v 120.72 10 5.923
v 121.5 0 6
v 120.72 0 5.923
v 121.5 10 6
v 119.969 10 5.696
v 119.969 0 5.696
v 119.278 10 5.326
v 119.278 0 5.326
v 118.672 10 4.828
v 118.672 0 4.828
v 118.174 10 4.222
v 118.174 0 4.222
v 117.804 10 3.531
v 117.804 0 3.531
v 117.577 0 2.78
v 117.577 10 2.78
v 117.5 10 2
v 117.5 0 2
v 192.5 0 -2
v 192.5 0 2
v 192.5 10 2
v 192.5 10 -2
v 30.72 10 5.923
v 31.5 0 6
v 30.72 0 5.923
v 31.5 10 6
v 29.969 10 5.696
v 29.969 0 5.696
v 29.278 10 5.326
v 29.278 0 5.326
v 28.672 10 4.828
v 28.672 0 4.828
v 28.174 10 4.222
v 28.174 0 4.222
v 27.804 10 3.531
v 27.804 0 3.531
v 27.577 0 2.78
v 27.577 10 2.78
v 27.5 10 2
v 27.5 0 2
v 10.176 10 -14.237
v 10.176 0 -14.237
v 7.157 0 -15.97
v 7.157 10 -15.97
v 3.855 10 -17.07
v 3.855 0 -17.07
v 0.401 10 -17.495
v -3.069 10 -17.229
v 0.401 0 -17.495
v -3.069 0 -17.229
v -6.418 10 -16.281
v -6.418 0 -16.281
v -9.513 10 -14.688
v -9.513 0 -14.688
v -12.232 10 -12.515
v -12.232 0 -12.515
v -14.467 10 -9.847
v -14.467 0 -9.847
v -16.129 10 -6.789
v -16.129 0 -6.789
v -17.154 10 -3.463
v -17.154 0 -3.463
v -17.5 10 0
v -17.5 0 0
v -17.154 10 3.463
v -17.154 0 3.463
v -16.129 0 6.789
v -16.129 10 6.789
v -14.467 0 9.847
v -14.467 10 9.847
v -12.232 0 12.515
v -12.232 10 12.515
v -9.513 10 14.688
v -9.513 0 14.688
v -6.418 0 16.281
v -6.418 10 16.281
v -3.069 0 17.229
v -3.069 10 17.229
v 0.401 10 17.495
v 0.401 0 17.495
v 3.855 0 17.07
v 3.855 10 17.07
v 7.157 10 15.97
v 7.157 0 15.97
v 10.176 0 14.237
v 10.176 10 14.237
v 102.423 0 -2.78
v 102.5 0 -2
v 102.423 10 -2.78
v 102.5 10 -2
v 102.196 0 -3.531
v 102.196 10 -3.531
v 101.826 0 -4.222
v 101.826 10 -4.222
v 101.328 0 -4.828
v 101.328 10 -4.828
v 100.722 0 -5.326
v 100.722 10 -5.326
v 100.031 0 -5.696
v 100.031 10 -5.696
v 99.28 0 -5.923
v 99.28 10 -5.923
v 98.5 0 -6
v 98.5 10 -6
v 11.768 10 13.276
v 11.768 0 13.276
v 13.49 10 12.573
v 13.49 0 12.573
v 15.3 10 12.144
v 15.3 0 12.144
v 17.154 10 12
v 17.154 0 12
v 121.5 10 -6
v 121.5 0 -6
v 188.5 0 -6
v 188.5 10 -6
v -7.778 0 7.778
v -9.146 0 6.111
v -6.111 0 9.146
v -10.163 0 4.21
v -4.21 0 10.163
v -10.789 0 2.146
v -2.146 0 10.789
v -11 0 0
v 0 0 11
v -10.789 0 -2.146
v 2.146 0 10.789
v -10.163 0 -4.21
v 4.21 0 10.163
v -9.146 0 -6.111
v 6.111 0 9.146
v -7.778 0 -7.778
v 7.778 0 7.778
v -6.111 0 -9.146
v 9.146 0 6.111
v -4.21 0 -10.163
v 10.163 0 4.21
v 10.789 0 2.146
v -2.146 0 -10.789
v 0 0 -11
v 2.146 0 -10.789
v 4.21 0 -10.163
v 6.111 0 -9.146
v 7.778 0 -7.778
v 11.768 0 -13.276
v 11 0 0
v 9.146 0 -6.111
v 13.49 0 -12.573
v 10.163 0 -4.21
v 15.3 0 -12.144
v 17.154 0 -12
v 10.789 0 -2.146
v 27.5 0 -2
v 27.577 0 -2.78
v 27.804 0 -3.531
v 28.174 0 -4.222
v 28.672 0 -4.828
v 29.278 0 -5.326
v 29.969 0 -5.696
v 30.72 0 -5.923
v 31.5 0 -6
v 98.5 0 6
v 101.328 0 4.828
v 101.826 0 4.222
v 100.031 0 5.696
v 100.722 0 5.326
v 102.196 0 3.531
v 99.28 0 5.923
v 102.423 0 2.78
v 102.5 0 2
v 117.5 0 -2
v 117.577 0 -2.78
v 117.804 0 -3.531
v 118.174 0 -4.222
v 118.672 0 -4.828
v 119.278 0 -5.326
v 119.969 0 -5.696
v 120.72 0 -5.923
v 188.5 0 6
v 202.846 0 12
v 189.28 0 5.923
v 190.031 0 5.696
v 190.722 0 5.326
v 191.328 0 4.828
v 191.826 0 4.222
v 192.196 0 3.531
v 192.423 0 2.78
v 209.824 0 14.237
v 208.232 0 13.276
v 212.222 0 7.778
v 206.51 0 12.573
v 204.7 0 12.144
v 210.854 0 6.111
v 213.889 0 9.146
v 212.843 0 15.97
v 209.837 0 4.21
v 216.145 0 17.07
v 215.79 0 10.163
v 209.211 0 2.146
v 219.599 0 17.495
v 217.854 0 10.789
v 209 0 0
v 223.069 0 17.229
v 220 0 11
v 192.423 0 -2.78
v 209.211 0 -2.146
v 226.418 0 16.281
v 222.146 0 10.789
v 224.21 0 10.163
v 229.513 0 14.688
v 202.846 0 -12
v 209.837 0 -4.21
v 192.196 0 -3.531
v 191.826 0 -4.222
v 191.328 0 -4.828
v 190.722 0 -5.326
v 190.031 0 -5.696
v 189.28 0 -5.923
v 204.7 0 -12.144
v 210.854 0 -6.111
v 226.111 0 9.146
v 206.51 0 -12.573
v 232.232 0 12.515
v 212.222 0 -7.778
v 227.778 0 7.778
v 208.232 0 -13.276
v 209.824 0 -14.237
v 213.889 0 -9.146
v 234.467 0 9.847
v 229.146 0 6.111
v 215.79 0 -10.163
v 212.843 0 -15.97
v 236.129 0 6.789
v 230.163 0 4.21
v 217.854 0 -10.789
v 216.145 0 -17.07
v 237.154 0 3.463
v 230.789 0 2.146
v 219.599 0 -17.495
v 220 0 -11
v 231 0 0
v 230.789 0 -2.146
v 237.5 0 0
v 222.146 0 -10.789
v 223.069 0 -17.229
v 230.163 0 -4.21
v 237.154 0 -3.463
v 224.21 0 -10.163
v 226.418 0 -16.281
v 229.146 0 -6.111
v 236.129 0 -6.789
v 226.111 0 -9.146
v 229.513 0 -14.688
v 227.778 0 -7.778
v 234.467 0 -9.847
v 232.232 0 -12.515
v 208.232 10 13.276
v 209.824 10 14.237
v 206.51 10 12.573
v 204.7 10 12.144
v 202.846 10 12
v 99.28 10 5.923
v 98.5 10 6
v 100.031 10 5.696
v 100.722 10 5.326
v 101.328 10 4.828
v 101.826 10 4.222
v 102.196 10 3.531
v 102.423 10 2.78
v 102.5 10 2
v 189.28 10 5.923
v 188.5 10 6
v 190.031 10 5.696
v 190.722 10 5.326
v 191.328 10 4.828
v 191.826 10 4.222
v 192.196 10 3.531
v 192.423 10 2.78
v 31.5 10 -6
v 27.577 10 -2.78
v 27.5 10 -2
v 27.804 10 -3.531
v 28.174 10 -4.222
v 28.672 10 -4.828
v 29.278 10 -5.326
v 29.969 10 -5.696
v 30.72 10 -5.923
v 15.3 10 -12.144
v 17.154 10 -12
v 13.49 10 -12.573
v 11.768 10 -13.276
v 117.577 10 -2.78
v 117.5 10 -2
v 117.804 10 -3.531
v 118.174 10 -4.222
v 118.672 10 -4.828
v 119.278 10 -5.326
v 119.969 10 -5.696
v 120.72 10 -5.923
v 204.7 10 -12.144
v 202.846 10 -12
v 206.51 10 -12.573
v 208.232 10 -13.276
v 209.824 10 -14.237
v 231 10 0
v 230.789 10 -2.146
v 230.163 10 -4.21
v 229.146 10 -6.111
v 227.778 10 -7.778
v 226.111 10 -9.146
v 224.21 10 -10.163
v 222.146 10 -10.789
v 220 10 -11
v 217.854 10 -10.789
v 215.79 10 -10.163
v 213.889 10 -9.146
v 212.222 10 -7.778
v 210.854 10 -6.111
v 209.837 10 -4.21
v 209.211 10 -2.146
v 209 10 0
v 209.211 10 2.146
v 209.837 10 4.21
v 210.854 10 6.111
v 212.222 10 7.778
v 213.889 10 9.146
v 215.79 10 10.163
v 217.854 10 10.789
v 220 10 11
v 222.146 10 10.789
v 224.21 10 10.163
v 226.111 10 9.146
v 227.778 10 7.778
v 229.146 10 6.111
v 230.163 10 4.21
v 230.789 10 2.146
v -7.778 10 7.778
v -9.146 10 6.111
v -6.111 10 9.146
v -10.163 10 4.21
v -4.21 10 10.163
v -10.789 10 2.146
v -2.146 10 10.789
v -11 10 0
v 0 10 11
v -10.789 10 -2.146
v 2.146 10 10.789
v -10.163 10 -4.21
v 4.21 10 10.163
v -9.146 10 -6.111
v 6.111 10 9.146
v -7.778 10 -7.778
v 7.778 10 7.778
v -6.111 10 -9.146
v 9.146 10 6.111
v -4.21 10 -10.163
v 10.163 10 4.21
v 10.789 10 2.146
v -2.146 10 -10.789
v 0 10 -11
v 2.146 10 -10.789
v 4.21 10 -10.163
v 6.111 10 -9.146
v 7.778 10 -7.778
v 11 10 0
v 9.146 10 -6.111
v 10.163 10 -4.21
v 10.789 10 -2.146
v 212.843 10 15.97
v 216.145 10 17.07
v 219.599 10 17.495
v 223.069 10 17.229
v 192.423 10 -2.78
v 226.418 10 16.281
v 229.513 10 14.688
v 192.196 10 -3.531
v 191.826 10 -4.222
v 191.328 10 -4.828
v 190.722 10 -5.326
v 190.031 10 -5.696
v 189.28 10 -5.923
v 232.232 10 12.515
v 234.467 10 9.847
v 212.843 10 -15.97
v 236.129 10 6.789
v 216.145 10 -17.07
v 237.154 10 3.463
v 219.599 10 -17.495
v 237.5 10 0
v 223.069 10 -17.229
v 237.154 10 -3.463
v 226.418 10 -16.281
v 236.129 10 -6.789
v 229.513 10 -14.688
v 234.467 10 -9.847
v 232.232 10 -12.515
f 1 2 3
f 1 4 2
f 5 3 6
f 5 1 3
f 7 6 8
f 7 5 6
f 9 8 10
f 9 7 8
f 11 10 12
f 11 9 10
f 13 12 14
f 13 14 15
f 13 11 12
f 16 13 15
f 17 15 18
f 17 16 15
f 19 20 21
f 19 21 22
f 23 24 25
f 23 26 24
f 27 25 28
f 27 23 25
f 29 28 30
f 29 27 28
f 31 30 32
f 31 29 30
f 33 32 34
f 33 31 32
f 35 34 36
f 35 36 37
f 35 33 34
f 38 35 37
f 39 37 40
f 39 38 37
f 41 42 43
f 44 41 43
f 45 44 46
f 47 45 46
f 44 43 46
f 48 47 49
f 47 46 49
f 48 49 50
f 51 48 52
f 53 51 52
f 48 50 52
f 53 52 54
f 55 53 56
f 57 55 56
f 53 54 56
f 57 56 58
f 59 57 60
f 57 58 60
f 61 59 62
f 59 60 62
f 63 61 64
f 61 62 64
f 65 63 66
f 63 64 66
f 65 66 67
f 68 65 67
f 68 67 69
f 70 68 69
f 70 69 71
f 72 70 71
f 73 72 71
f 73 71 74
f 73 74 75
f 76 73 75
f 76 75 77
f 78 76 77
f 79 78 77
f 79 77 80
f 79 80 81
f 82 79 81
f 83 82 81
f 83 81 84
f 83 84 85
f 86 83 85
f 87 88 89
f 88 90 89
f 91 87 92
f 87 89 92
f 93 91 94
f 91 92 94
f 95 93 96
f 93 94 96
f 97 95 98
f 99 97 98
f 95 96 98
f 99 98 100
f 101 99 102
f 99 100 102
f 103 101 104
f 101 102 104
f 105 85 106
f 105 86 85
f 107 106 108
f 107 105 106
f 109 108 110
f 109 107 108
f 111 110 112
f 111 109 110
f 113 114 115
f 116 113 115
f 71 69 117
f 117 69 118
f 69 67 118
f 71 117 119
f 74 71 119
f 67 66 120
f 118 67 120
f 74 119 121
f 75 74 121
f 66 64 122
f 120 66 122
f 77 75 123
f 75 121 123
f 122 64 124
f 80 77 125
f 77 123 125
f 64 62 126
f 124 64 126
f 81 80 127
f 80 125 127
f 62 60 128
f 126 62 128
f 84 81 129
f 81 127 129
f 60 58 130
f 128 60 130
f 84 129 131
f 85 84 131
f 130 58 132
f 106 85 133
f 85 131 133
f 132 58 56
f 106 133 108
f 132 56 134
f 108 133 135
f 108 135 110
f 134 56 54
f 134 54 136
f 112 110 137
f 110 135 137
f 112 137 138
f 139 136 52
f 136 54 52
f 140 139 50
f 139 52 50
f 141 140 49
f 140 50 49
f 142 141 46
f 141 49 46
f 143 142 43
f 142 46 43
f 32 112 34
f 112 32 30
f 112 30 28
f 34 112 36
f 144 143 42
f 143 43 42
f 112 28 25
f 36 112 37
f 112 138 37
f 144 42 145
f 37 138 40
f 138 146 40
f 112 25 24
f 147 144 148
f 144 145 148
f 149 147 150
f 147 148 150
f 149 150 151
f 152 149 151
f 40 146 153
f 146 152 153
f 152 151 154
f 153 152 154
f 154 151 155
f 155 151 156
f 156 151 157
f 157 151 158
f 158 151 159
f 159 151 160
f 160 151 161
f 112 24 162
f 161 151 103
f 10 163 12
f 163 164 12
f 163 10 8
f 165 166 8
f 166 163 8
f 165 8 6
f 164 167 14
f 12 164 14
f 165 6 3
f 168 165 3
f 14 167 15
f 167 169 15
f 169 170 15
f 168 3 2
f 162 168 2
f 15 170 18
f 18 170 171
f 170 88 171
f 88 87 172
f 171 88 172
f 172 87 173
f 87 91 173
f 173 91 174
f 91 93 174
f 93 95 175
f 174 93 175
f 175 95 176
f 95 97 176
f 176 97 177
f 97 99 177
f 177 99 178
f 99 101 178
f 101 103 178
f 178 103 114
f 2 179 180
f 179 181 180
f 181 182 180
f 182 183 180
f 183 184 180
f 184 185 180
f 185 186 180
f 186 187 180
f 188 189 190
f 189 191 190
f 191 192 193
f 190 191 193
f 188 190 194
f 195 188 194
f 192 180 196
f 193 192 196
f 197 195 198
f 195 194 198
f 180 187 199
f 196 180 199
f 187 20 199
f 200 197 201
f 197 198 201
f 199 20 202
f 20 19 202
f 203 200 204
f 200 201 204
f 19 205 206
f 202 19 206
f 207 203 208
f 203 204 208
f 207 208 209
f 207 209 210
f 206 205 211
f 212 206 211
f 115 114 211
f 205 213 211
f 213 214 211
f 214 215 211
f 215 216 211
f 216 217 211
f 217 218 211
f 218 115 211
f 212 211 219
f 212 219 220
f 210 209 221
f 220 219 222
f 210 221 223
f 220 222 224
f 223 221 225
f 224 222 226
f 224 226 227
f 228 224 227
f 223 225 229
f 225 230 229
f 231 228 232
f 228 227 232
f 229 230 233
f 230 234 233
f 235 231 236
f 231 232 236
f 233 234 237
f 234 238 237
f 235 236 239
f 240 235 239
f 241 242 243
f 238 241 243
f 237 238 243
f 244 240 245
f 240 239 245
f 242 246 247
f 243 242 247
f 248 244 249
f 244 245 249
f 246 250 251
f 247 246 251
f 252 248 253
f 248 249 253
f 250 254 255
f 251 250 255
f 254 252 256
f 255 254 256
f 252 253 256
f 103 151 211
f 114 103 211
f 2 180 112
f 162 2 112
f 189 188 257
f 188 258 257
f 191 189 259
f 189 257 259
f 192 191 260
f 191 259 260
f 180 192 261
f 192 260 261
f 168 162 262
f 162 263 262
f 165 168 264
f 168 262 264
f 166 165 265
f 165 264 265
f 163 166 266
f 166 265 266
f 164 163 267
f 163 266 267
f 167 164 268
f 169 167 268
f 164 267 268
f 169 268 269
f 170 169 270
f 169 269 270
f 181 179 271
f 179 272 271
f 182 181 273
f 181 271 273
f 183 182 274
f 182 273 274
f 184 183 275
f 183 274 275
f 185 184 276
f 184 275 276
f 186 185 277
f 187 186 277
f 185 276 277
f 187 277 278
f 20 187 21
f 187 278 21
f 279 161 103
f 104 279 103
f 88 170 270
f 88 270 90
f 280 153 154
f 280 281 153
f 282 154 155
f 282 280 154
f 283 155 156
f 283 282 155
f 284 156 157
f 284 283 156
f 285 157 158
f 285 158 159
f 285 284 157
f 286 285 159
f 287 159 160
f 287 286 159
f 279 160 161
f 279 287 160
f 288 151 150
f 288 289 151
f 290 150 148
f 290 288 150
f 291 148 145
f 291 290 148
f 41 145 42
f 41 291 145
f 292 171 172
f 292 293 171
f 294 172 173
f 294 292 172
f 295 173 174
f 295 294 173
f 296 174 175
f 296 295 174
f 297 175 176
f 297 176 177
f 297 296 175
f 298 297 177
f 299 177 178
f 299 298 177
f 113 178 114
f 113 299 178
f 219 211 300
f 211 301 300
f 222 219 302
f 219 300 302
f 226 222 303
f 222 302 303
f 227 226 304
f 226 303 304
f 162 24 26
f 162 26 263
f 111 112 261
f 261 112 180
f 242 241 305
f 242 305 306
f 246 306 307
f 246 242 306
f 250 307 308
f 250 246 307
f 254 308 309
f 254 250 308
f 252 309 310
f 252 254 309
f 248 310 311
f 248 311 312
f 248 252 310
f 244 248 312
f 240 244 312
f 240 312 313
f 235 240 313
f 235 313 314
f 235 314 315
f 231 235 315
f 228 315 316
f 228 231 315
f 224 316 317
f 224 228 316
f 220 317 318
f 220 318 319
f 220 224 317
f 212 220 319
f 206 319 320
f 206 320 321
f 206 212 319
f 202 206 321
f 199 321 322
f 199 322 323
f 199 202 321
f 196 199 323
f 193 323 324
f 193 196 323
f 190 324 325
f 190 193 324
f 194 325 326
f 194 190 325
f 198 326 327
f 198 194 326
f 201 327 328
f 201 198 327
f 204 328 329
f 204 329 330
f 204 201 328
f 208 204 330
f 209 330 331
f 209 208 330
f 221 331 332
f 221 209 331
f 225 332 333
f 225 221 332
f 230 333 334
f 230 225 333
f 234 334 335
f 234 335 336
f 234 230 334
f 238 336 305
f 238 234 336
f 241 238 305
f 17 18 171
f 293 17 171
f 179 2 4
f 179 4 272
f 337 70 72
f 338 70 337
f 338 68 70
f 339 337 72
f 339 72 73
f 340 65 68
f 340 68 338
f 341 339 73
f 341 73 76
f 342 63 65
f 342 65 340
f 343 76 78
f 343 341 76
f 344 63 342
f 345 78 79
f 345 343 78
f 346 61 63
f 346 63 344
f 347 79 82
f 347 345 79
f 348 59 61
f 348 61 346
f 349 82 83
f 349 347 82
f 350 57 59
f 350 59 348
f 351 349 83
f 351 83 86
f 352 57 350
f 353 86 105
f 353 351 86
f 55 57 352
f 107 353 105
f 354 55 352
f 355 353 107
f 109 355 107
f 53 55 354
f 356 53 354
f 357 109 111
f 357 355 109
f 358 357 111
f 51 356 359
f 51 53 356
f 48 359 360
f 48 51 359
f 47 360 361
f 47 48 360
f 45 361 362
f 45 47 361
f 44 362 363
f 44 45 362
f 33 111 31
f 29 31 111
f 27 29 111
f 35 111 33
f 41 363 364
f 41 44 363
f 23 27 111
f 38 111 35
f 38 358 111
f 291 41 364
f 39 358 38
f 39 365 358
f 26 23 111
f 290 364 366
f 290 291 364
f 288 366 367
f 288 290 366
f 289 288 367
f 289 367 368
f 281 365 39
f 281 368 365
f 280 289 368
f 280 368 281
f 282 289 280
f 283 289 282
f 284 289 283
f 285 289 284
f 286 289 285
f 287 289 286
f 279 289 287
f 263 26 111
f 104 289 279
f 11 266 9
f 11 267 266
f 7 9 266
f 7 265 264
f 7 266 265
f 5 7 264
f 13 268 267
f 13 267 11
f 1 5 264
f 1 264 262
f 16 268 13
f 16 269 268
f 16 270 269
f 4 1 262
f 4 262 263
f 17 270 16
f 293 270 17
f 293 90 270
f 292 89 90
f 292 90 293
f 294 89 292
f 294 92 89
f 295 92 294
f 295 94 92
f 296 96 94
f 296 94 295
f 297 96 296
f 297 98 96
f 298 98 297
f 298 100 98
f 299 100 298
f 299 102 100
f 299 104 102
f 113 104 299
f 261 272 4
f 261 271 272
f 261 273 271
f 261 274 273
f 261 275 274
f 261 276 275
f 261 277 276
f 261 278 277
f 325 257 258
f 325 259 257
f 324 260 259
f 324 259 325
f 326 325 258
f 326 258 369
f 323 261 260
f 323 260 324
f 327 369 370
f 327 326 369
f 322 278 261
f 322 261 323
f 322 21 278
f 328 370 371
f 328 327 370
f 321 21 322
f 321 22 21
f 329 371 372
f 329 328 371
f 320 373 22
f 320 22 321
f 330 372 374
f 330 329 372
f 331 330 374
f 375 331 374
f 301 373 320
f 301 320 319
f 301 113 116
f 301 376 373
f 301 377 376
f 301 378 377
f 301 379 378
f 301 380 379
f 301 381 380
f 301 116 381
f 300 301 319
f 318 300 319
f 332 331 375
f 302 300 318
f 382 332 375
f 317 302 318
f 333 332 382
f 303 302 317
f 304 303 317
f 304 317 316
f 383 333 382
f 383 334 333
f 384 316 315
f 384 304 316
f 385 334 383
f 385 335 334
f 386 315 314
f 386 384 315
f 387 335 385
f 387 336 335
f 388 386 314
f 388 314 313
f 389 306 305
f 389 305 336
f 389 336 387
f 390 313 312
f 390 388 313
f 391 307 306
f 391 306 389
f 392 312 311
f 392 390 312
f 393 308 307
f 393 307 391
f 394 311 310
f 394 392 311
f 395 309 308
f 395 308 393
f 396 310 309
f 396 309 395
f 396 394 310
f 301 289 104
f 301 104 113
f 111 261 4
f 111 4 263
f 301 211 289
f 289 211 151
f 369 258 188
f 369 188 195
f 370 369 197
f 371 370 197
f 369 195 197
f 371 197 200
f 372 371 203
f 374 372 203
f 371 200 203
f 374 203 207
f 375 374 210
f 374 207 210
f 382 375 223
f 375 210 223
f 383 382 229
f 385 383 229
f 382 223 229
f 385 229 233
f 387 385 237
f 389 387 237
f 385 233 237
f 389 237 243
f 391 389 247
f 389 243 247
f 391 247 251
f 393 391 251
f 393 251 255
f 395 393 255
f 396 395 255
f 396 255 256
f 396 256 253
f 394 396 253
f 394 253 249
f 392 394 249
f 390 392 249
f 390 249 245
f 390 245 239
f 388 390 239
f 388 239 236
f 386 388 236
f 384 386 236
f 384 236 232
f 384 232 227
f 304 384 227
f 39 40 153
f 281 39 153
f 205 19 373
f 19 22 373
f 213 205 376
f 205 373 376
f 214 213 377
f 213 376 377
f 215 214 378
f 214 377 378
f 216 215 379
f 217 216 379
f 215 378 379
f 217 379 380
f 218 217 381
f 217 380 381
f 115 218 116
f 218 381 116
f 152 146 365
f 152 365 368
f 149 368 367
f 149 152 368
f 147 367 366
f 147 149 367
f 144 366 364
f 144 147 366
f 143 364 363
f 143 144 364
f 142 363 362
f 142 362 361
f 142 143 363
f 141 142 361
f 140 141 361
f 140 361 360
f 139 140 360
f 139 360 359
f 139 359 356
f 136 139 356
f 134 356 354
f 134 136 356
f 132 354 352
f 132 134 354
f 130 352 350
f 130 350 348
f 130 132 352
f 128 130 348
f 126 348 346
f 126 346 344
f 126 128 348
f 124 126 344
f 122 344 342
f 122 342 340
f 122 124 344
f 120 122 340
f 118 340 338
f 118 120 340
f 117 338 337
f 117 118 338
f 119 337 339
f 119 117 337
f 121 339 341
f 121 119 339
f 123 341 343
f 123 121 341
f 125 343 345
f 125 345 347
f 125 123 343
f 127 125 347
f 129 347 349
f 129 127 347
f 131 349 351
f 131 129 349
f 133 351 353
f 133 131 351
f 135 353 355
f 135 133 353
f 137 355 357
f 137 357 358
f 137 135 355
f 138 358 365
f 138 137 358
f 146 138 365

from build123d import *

# Parameters (mm, degrees)
SKETCH1_W           = 75
SKETCH1_H           = 12
SKETCH1_R           = 17.5
SKETCH1_R_2         = 11
BOSS_EXTRUDE1_DEPTH = 10
FILLET1_R           = 4
FILLET2_R           = 12


with BuildPart() as part:
    # Sketch1 → Boss-Extrude1 (new body)
    with BuildSketch(Plane(origin=(0, 0, 0), x_dir=(1, 0, 0), z_dir=(0, 1, 0))):
        with BuildLine():
            Line((197.072466256, 12), (12.737739203, 12))
            ThreePointArc((12.737739203, 12), (16.265921985, 6.45521355), (17.5, 0))
            ThreePointArc((17.5, 0), (16.265921985, -6.45521355), (12.737739203, -12))
            Line((12.737739203, -12), (207.262260797, -12))
            ThreePointArc((207.262260797, -12), (202.5, 0), (207.262260797, 12))
            Line((207.262260797, 12), (197.072466256, 12))
        make_face()
        with Locations((65, 0)):
            Rectangle(SKETCH1_W, SKETCH1_H, mode=Mode.SUBTRACT)
        with Locations((155, 0)):
            Rectangle(SKETCH1_W, SKETCH1_H, mode=Mode.SUBTRACT)
        Circle(SKETCH1_R)
        Circle(SKETCH1_R_2, mode=Mode.SUBTRACT)
        with Locations((220, 0)):
            Circle(SKETCH1_R)
        with Locations((220, 0)):
            Circle(SKETCH1_R_2, mode=Mode.SUBTRACT)
    extrude(amount=BOSS_EXTRUDE1_DEPTH)

    # Fillet1
    fillet1_edges = [part.edges().sort_by_distance(p)[0] for p in [
        (27.5, 5, -6),
        (27.5, 5, 6),
        (102.5, 5, 6),
        (102.5, 5, -6),
        (117.5, 5, -6),
        (117.5, 5, 6),
        (192.5, 5, 6),
        (192.5, 5, -6),
    ]]
    fillet(fillet1_edges, radius=FILLET1_R)

    # Fillet2
    fillet2_edges = [part.edges().sort_by_distance(p)[0] for p in [
        (12.737739203, 5, 12),
        (12.737739203, 5, -12),
        (207.262260797, 5, -12),
        (207.262260797, 5, 12),
    ]]
    fillet(fillet2_edges, radius=FILLET2_R)


solid = part.part
